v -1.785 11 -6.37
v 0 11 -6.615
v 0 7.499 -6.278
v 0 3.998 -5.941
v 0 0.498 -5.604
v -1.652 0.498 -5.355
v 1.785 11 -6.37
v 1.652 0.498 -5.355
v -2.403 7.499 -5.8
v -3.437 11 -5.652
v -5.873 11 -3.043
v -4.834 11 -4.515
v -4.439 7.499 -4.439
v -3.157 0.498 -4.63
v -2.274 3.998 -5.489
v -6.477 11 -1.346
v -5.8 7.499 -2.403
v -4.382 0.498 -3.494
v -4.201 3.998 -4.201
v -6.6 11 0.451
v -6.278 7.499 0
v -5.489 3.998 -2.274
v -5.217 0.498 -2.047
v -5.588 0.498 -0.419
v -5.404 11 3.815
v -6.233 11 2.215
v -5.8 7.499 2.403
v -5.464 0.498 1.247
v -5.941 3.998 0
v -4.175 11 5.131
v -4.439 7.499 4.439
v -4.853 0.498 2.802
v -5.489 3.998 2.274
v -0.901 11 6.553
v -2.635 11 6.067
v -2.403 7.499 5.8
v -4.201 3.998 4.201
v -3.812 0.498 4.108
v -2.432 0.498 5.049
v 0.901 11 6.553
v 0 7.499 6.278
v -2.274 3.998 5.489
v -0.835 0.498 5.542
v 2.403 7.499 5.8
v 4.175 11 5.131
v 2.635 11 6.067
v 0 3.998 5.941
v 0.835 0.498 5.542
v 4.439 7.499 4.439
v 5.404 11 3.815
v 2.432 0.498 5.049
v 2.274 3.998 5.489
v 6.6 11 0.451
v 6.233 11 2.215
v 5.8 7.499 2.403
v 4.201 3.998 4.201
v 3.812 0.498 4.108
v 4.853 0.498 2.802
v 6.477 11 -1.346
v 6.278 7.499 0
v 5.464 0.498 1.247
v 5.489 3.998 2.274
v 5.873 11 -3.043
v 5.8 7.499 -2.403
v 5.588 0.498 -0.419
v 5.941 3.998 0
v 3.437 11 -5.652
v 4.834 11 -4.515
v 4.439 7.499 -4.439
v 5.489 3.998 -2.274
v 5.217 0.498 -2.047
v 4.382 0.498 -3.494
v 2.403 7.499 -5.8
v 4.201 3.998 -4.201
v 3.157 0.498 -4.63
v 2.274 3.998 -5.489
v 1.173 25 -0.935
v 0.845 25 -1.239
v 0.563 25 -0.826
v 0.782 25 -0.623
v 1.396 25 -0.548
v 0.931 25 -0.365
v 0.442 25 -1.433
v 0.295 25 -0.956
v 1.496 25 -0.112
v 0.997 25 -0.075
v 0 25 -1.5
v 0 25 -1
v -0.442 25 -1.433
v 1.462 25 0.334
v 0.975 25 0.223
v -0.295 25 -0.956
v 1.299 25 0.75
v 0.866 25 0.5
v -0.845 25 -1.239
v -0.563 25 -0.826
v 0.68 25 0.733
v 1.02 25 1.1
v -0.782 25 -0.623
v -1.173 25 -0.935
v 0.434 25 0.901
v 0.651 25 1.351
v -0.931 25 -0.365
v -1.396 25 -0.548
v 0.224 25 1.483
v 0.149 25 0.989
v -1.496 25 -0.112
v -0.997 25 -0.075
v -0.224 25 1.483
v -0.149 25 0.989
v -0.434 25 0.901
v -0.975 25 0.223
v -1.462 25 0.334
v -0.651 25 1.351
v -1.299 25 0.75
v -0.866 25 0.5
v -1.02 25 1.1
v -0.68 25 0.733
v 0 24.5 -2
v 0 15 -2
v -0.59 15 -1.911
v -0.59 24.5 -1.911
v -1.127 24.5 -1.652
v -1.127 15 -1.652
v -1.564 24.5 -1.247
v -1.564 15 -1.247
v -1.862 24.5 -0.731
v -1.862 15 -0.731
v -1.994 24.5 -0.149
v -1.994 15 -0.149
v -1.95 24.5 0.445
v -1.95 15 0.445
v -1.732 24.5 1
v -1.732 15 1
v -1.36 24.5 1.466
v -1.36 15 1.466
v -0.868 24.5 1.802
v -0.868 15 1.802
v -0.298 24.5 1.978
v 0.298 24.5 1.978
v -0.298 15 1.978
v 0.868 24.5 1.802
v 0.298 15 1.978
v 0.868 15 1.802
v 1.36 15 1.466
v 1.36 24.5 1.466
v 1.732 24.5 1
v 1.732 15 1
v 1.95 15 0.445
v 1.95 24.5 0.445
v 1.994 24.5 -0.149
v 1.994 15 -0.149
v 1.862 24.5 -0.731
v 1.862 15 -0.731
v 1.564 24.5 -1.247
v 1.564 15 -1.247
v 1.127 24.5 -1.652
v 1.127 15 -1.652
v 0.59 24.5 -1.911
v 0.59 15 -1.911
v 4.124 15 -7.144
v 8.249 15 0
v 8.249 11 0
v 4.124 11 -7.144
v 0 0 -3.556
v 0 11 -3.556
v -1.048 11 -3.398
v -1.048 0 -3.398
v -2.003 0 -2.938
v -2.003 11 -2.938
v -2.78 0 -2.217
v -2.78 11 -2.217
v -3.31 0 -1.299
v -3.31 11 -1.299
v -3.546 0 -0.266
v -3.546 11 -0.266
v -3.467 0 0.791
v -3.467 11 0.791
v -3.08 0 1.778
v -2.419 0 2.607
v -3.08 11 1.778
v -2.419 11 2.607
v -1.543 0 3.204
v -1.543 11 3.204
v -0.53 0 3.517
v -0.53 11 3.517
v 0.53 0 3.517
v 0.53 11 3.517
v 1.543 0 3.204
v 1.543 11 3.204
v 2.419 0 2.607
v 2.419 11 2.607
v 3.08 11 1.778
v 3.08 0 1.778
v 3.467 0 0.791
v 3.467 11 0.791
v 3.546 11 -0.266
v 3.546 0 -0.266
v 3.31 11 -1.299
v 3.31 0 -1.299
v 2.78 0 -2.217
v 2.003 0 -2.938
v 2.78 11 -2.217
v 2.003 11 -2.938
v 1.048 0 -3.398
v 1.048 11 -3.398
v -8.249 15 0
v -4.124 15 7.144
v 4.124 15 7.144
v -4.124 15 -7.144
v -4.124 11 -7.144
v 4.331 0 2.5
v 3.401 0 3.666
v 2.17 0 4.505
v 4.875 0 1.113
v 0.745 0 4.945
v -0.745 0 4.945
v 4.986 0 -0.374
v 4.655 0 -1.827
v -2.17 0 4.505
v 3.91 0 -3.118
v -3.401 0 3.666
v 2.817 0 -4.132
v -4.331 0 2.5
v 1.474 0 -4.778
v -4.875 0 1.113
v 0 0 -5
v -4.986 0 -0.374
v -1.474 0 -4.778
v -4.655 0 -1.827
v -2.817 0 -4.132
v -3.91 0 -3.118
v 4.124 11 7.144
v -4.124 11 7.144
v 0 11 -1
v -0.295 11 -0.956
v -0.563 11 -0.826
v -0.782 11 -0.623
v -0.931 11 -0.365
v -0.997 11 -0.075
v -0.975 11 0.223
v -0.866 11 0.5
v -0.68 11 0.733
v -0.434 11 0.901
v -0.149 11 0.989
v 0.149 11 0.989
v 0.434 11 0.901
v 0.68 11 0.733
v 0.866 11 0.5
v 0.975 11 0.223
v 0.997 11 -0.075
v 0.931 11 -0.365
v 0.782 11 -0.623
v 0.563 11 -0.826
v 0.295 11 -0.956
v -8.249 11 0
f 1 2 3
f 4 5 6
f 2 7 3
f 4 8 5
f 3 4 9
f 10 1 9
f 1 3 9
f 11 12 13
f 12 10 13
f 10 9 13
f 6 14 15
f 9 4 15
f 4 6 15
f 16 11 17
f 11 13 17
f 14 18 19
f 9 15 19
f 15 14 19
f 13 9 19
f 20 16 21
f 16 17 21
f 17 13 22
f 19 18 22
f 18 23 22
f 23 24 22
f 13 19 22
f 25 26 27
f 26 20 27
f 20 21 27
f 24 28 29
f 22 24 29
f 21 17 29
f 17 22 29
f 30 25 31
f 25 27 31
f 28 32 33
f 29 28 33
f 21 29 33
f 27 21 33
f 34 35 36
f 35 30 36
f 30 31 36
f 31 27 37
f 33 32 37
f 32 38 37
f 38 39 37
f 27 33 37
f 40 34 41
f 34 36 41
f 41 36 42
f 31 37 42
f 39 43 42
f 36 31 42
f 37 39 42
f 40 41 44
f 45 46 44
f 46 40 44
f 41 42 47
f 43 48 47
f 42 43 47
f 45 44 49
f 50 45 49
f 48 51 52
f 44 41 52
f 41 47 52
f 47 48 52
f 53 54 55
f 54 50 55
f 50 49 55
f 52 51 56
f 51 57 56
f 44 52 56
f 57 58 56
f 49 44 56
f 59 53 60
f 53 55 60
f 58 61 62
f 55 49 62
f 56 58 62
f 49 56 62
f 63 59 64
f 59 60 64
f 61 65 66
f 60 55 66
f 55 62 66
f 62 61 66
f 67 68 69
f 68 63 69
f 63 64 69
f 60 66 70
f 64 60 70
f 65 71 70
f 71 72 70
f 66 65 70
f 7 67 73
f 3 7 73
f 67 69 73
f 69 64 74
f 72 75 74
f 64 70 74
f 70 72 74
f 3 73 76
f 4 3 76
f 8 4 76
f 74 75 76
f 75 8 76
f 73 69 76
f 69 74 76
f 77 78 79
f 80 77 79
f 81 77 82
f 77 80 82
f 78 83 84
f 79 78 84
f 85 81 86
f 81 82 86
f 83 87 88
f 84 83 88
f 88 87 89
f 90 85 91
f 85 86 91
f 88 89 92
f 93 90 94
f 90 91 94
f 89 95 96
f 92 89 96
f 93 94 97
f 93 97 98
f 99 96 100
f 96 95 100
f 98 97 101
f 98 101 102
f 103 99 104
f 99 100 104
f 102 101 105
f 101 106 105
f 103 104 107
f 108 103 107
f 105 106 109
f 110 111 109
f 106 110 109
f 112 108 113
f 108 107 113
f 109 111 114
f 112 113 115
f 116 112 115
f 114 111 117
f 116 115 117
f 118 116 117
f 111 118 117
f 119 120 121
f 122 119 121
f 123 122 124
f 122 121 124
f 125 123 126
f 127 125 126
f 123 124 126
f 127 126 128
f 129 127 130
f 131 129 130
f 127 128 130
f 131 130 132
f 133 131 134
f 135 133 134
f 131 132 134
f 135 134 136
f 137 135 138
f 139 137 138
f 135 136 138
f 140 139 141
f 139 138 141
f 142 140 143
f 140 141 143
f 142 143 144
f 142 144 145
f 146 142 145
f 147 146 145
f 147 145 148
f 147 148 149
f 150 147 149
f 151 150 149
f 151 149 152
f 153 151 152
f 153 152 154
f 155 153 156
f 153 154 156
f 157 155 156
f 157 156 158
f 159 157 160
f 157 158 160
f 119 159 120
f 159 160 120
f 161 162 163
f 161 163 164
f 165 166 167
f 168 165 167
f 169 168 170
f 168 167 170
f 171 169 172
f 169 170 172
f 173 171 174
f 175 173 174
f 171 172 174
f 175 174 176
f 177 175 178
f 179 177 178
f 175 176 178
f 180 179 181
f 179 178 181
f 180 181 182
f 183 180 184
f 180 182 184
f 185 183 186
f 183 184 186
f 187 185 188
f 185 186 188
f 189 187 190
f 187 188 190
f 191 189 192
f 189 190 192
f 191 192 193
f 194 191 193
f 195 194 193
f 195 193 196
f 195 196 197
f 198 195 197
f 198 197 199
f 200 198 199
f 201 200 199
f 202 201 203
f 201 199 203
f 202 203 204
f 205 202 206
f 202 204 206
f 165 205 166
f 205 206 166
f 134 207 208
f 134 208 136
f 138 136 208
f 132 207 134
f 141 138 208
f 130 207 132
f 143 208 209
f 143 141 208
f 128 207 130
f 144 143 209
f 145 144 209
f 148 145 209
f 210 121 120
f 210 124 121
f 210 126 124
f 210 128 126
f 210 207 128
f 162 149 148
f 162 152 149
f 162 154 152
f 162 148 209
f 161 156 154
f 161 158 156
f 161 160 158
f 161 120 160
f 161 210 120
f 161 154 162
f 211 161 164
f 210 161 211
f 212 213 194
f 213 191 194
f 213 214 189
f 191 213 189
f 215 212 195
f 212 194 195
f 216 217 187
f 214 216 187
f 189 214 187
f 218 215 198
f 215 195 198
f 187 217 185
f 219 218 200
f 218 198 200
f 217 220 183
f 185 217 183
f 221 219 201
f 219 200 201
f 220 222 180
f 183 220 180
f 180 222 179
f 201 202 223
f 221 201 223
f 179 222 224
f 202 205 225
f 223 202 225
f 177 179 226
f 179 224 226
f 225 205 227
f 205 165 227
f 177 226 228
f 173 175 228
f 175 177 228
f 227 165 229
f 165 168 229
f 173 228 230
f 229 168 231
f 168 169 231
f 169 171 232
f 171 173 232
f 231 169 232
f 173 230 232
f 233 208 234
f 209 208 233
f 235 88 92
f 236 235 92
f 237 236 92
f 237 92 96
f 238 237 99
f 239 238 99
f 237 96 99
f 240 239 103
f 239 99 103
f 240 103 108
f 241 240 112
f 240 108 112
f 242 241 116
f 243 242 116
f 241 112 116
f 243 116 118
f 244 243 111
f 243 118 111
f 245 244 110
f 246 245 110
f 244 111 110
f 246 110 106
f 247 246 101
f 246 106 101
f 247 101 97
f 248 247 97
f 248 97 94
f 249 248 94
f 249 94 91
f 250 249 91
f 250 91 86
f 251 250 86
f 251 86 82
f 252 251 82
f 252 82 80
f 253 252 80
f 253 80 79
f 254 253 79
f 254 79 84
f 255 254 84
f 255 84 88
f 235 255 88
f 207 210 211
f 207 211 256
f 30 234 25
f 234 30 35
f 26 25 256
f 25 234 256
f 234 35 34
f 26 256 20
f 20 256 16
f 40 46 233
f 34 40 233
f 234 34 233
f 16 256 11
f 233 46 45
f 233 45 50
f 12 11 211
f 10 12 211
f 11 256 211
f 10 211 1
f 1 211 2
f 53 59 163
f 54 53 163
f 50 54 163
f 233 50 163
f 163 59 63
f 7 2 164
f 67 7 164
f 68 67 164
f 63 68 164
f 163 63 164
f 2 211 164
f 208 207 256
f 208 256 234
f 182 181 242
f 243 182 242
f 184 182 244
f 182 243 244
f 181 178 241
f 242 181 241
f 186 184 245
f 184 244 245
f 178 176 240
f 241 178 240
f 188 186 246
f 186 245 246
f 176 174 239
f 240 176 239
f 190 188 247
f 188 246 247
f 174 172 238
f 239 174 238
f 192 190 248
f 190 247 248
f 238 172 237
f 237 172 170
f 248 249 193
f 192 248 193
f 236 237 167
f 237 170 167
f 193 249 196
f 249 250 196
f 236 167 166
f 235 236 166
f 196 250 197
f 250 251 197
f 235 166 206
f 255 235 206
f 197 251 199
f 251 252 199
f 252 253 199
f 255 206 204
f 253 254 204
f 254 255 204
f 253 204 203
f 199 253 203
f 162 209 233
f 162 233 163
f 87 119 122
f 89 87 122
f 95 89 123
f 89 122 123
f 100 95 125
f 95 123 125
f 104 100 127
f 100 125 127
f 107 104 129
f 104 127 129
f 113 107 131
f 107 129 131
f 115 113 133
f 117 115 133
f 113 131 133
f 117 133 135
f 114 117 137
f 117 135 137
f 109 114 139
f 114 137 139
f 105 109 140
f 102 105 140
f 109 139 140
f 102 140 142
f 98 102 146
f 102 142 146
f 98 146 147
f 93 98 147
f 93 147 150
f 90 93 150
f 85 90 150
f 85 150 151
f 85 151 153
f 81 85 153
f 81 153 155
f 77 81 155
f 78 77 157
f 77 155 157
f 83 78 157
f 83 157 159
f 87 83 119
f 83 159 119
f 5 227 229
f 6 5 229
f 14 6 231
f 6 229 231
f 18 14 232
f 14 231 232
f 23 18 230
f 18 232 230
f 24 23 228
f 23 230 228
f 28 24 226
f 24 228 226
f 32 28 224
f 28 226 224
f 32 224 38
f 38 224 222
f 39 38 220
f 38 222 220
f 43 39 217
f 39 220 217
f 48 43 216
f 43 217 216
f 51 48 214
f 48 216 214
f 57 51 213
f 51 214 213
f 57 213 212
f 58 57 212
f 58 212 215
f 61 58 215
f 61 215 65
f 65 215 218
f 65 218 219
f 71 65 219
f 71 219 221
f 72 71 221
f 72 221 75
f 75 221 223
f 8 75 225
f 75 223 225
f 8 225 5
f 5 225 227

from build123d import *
from OCP.BRepFilletAPI import BRepFilletAPI_MakeChamfer

# Parameters (mm, degrees)
SKETCH2_R           = 1
BOSS_EXTRUDE1_DEPTH = 4
CHAMFER1_SIZE       = 0.5
CHAMFER1_SIZE2      = 0.555807111


with BuildPart() as part:
    # Sketch1 → Revolve1 (revolve)
    with BuildSketch(Plane.XY, mode=Mode.PRIVATE) as revolve1_sk:
        Polygon((1, 25), (2, 25), (2, 15), (7, 15), (5.55625, 0), (3.55625, 0), (3.55625, 12), (1, 12), align=None)
    revolve(revolve1_sk.sketch.rotate(Axis((0, 0, 0), (0, 1, 0)), 90), axis=Axis((0, 0, 0), (0, 1, 0)))

    # Sketch2 → Boss-Extrude1 (add)
    with BuildSketch(Plane(origin=(0, 15, 0), x_dir=(1, 0, 0), z_dir=(0, 1, 0))):
        Polygon((-8.248891971, 0), (-4.124445986, -7.14375), (4.124445986, -7.14375), (8.248891971, 0), (4.124445986, 7.14375), (-4.124445986, 7.14375), align=None)
        with Locations(Location((0, 0, 0), (0, 0, 90))):
            Circle(SKETCH2_R, mode=Mode.SUBTRACT)
    extrude(amount=-BOSS_EXTRUDE1_DEPTH)

    # Chamfer1: one chamfer whose edges measure the first distance from different faces: ONE call of the kernel's chamfer builder (chamfer() names one face for all edges)
    chamfer1_edges_1 = [part.edges().sort_by_distance(p)[0] for p in [
        (0, 0, 5.55625),
    ]]
    chamfer1_side_1 = [part.faces().sort_by_distance(p)[0] for p in [
        (0, 5.5, 6.085625),
    ]]
    chamfer1_edges_2 = [part.edges().sort_by_distance(p)[0] for p in [
        (0, 25, 2),
    ]]
    chamfer1 = BRepFilletAPI_MakeChamfer(part.part.solid().wrapped)
    for e in chamfer1_edges_1:
        chamfer1.Add(CHAMFER1_SIZE, CHAMFER1_SIZE2, e.wrapped, chamfer1_side_1[0].wrapped)  # the first distance lies on this face
    for e in chamfer1_edges_2:
        chamfer1.Add(CHAMFER1_SIZE, e.wrapped)
    add(Compound.cast(chamfer1.Shape()), mode=Mode.REPLACE)


solid = part.part
